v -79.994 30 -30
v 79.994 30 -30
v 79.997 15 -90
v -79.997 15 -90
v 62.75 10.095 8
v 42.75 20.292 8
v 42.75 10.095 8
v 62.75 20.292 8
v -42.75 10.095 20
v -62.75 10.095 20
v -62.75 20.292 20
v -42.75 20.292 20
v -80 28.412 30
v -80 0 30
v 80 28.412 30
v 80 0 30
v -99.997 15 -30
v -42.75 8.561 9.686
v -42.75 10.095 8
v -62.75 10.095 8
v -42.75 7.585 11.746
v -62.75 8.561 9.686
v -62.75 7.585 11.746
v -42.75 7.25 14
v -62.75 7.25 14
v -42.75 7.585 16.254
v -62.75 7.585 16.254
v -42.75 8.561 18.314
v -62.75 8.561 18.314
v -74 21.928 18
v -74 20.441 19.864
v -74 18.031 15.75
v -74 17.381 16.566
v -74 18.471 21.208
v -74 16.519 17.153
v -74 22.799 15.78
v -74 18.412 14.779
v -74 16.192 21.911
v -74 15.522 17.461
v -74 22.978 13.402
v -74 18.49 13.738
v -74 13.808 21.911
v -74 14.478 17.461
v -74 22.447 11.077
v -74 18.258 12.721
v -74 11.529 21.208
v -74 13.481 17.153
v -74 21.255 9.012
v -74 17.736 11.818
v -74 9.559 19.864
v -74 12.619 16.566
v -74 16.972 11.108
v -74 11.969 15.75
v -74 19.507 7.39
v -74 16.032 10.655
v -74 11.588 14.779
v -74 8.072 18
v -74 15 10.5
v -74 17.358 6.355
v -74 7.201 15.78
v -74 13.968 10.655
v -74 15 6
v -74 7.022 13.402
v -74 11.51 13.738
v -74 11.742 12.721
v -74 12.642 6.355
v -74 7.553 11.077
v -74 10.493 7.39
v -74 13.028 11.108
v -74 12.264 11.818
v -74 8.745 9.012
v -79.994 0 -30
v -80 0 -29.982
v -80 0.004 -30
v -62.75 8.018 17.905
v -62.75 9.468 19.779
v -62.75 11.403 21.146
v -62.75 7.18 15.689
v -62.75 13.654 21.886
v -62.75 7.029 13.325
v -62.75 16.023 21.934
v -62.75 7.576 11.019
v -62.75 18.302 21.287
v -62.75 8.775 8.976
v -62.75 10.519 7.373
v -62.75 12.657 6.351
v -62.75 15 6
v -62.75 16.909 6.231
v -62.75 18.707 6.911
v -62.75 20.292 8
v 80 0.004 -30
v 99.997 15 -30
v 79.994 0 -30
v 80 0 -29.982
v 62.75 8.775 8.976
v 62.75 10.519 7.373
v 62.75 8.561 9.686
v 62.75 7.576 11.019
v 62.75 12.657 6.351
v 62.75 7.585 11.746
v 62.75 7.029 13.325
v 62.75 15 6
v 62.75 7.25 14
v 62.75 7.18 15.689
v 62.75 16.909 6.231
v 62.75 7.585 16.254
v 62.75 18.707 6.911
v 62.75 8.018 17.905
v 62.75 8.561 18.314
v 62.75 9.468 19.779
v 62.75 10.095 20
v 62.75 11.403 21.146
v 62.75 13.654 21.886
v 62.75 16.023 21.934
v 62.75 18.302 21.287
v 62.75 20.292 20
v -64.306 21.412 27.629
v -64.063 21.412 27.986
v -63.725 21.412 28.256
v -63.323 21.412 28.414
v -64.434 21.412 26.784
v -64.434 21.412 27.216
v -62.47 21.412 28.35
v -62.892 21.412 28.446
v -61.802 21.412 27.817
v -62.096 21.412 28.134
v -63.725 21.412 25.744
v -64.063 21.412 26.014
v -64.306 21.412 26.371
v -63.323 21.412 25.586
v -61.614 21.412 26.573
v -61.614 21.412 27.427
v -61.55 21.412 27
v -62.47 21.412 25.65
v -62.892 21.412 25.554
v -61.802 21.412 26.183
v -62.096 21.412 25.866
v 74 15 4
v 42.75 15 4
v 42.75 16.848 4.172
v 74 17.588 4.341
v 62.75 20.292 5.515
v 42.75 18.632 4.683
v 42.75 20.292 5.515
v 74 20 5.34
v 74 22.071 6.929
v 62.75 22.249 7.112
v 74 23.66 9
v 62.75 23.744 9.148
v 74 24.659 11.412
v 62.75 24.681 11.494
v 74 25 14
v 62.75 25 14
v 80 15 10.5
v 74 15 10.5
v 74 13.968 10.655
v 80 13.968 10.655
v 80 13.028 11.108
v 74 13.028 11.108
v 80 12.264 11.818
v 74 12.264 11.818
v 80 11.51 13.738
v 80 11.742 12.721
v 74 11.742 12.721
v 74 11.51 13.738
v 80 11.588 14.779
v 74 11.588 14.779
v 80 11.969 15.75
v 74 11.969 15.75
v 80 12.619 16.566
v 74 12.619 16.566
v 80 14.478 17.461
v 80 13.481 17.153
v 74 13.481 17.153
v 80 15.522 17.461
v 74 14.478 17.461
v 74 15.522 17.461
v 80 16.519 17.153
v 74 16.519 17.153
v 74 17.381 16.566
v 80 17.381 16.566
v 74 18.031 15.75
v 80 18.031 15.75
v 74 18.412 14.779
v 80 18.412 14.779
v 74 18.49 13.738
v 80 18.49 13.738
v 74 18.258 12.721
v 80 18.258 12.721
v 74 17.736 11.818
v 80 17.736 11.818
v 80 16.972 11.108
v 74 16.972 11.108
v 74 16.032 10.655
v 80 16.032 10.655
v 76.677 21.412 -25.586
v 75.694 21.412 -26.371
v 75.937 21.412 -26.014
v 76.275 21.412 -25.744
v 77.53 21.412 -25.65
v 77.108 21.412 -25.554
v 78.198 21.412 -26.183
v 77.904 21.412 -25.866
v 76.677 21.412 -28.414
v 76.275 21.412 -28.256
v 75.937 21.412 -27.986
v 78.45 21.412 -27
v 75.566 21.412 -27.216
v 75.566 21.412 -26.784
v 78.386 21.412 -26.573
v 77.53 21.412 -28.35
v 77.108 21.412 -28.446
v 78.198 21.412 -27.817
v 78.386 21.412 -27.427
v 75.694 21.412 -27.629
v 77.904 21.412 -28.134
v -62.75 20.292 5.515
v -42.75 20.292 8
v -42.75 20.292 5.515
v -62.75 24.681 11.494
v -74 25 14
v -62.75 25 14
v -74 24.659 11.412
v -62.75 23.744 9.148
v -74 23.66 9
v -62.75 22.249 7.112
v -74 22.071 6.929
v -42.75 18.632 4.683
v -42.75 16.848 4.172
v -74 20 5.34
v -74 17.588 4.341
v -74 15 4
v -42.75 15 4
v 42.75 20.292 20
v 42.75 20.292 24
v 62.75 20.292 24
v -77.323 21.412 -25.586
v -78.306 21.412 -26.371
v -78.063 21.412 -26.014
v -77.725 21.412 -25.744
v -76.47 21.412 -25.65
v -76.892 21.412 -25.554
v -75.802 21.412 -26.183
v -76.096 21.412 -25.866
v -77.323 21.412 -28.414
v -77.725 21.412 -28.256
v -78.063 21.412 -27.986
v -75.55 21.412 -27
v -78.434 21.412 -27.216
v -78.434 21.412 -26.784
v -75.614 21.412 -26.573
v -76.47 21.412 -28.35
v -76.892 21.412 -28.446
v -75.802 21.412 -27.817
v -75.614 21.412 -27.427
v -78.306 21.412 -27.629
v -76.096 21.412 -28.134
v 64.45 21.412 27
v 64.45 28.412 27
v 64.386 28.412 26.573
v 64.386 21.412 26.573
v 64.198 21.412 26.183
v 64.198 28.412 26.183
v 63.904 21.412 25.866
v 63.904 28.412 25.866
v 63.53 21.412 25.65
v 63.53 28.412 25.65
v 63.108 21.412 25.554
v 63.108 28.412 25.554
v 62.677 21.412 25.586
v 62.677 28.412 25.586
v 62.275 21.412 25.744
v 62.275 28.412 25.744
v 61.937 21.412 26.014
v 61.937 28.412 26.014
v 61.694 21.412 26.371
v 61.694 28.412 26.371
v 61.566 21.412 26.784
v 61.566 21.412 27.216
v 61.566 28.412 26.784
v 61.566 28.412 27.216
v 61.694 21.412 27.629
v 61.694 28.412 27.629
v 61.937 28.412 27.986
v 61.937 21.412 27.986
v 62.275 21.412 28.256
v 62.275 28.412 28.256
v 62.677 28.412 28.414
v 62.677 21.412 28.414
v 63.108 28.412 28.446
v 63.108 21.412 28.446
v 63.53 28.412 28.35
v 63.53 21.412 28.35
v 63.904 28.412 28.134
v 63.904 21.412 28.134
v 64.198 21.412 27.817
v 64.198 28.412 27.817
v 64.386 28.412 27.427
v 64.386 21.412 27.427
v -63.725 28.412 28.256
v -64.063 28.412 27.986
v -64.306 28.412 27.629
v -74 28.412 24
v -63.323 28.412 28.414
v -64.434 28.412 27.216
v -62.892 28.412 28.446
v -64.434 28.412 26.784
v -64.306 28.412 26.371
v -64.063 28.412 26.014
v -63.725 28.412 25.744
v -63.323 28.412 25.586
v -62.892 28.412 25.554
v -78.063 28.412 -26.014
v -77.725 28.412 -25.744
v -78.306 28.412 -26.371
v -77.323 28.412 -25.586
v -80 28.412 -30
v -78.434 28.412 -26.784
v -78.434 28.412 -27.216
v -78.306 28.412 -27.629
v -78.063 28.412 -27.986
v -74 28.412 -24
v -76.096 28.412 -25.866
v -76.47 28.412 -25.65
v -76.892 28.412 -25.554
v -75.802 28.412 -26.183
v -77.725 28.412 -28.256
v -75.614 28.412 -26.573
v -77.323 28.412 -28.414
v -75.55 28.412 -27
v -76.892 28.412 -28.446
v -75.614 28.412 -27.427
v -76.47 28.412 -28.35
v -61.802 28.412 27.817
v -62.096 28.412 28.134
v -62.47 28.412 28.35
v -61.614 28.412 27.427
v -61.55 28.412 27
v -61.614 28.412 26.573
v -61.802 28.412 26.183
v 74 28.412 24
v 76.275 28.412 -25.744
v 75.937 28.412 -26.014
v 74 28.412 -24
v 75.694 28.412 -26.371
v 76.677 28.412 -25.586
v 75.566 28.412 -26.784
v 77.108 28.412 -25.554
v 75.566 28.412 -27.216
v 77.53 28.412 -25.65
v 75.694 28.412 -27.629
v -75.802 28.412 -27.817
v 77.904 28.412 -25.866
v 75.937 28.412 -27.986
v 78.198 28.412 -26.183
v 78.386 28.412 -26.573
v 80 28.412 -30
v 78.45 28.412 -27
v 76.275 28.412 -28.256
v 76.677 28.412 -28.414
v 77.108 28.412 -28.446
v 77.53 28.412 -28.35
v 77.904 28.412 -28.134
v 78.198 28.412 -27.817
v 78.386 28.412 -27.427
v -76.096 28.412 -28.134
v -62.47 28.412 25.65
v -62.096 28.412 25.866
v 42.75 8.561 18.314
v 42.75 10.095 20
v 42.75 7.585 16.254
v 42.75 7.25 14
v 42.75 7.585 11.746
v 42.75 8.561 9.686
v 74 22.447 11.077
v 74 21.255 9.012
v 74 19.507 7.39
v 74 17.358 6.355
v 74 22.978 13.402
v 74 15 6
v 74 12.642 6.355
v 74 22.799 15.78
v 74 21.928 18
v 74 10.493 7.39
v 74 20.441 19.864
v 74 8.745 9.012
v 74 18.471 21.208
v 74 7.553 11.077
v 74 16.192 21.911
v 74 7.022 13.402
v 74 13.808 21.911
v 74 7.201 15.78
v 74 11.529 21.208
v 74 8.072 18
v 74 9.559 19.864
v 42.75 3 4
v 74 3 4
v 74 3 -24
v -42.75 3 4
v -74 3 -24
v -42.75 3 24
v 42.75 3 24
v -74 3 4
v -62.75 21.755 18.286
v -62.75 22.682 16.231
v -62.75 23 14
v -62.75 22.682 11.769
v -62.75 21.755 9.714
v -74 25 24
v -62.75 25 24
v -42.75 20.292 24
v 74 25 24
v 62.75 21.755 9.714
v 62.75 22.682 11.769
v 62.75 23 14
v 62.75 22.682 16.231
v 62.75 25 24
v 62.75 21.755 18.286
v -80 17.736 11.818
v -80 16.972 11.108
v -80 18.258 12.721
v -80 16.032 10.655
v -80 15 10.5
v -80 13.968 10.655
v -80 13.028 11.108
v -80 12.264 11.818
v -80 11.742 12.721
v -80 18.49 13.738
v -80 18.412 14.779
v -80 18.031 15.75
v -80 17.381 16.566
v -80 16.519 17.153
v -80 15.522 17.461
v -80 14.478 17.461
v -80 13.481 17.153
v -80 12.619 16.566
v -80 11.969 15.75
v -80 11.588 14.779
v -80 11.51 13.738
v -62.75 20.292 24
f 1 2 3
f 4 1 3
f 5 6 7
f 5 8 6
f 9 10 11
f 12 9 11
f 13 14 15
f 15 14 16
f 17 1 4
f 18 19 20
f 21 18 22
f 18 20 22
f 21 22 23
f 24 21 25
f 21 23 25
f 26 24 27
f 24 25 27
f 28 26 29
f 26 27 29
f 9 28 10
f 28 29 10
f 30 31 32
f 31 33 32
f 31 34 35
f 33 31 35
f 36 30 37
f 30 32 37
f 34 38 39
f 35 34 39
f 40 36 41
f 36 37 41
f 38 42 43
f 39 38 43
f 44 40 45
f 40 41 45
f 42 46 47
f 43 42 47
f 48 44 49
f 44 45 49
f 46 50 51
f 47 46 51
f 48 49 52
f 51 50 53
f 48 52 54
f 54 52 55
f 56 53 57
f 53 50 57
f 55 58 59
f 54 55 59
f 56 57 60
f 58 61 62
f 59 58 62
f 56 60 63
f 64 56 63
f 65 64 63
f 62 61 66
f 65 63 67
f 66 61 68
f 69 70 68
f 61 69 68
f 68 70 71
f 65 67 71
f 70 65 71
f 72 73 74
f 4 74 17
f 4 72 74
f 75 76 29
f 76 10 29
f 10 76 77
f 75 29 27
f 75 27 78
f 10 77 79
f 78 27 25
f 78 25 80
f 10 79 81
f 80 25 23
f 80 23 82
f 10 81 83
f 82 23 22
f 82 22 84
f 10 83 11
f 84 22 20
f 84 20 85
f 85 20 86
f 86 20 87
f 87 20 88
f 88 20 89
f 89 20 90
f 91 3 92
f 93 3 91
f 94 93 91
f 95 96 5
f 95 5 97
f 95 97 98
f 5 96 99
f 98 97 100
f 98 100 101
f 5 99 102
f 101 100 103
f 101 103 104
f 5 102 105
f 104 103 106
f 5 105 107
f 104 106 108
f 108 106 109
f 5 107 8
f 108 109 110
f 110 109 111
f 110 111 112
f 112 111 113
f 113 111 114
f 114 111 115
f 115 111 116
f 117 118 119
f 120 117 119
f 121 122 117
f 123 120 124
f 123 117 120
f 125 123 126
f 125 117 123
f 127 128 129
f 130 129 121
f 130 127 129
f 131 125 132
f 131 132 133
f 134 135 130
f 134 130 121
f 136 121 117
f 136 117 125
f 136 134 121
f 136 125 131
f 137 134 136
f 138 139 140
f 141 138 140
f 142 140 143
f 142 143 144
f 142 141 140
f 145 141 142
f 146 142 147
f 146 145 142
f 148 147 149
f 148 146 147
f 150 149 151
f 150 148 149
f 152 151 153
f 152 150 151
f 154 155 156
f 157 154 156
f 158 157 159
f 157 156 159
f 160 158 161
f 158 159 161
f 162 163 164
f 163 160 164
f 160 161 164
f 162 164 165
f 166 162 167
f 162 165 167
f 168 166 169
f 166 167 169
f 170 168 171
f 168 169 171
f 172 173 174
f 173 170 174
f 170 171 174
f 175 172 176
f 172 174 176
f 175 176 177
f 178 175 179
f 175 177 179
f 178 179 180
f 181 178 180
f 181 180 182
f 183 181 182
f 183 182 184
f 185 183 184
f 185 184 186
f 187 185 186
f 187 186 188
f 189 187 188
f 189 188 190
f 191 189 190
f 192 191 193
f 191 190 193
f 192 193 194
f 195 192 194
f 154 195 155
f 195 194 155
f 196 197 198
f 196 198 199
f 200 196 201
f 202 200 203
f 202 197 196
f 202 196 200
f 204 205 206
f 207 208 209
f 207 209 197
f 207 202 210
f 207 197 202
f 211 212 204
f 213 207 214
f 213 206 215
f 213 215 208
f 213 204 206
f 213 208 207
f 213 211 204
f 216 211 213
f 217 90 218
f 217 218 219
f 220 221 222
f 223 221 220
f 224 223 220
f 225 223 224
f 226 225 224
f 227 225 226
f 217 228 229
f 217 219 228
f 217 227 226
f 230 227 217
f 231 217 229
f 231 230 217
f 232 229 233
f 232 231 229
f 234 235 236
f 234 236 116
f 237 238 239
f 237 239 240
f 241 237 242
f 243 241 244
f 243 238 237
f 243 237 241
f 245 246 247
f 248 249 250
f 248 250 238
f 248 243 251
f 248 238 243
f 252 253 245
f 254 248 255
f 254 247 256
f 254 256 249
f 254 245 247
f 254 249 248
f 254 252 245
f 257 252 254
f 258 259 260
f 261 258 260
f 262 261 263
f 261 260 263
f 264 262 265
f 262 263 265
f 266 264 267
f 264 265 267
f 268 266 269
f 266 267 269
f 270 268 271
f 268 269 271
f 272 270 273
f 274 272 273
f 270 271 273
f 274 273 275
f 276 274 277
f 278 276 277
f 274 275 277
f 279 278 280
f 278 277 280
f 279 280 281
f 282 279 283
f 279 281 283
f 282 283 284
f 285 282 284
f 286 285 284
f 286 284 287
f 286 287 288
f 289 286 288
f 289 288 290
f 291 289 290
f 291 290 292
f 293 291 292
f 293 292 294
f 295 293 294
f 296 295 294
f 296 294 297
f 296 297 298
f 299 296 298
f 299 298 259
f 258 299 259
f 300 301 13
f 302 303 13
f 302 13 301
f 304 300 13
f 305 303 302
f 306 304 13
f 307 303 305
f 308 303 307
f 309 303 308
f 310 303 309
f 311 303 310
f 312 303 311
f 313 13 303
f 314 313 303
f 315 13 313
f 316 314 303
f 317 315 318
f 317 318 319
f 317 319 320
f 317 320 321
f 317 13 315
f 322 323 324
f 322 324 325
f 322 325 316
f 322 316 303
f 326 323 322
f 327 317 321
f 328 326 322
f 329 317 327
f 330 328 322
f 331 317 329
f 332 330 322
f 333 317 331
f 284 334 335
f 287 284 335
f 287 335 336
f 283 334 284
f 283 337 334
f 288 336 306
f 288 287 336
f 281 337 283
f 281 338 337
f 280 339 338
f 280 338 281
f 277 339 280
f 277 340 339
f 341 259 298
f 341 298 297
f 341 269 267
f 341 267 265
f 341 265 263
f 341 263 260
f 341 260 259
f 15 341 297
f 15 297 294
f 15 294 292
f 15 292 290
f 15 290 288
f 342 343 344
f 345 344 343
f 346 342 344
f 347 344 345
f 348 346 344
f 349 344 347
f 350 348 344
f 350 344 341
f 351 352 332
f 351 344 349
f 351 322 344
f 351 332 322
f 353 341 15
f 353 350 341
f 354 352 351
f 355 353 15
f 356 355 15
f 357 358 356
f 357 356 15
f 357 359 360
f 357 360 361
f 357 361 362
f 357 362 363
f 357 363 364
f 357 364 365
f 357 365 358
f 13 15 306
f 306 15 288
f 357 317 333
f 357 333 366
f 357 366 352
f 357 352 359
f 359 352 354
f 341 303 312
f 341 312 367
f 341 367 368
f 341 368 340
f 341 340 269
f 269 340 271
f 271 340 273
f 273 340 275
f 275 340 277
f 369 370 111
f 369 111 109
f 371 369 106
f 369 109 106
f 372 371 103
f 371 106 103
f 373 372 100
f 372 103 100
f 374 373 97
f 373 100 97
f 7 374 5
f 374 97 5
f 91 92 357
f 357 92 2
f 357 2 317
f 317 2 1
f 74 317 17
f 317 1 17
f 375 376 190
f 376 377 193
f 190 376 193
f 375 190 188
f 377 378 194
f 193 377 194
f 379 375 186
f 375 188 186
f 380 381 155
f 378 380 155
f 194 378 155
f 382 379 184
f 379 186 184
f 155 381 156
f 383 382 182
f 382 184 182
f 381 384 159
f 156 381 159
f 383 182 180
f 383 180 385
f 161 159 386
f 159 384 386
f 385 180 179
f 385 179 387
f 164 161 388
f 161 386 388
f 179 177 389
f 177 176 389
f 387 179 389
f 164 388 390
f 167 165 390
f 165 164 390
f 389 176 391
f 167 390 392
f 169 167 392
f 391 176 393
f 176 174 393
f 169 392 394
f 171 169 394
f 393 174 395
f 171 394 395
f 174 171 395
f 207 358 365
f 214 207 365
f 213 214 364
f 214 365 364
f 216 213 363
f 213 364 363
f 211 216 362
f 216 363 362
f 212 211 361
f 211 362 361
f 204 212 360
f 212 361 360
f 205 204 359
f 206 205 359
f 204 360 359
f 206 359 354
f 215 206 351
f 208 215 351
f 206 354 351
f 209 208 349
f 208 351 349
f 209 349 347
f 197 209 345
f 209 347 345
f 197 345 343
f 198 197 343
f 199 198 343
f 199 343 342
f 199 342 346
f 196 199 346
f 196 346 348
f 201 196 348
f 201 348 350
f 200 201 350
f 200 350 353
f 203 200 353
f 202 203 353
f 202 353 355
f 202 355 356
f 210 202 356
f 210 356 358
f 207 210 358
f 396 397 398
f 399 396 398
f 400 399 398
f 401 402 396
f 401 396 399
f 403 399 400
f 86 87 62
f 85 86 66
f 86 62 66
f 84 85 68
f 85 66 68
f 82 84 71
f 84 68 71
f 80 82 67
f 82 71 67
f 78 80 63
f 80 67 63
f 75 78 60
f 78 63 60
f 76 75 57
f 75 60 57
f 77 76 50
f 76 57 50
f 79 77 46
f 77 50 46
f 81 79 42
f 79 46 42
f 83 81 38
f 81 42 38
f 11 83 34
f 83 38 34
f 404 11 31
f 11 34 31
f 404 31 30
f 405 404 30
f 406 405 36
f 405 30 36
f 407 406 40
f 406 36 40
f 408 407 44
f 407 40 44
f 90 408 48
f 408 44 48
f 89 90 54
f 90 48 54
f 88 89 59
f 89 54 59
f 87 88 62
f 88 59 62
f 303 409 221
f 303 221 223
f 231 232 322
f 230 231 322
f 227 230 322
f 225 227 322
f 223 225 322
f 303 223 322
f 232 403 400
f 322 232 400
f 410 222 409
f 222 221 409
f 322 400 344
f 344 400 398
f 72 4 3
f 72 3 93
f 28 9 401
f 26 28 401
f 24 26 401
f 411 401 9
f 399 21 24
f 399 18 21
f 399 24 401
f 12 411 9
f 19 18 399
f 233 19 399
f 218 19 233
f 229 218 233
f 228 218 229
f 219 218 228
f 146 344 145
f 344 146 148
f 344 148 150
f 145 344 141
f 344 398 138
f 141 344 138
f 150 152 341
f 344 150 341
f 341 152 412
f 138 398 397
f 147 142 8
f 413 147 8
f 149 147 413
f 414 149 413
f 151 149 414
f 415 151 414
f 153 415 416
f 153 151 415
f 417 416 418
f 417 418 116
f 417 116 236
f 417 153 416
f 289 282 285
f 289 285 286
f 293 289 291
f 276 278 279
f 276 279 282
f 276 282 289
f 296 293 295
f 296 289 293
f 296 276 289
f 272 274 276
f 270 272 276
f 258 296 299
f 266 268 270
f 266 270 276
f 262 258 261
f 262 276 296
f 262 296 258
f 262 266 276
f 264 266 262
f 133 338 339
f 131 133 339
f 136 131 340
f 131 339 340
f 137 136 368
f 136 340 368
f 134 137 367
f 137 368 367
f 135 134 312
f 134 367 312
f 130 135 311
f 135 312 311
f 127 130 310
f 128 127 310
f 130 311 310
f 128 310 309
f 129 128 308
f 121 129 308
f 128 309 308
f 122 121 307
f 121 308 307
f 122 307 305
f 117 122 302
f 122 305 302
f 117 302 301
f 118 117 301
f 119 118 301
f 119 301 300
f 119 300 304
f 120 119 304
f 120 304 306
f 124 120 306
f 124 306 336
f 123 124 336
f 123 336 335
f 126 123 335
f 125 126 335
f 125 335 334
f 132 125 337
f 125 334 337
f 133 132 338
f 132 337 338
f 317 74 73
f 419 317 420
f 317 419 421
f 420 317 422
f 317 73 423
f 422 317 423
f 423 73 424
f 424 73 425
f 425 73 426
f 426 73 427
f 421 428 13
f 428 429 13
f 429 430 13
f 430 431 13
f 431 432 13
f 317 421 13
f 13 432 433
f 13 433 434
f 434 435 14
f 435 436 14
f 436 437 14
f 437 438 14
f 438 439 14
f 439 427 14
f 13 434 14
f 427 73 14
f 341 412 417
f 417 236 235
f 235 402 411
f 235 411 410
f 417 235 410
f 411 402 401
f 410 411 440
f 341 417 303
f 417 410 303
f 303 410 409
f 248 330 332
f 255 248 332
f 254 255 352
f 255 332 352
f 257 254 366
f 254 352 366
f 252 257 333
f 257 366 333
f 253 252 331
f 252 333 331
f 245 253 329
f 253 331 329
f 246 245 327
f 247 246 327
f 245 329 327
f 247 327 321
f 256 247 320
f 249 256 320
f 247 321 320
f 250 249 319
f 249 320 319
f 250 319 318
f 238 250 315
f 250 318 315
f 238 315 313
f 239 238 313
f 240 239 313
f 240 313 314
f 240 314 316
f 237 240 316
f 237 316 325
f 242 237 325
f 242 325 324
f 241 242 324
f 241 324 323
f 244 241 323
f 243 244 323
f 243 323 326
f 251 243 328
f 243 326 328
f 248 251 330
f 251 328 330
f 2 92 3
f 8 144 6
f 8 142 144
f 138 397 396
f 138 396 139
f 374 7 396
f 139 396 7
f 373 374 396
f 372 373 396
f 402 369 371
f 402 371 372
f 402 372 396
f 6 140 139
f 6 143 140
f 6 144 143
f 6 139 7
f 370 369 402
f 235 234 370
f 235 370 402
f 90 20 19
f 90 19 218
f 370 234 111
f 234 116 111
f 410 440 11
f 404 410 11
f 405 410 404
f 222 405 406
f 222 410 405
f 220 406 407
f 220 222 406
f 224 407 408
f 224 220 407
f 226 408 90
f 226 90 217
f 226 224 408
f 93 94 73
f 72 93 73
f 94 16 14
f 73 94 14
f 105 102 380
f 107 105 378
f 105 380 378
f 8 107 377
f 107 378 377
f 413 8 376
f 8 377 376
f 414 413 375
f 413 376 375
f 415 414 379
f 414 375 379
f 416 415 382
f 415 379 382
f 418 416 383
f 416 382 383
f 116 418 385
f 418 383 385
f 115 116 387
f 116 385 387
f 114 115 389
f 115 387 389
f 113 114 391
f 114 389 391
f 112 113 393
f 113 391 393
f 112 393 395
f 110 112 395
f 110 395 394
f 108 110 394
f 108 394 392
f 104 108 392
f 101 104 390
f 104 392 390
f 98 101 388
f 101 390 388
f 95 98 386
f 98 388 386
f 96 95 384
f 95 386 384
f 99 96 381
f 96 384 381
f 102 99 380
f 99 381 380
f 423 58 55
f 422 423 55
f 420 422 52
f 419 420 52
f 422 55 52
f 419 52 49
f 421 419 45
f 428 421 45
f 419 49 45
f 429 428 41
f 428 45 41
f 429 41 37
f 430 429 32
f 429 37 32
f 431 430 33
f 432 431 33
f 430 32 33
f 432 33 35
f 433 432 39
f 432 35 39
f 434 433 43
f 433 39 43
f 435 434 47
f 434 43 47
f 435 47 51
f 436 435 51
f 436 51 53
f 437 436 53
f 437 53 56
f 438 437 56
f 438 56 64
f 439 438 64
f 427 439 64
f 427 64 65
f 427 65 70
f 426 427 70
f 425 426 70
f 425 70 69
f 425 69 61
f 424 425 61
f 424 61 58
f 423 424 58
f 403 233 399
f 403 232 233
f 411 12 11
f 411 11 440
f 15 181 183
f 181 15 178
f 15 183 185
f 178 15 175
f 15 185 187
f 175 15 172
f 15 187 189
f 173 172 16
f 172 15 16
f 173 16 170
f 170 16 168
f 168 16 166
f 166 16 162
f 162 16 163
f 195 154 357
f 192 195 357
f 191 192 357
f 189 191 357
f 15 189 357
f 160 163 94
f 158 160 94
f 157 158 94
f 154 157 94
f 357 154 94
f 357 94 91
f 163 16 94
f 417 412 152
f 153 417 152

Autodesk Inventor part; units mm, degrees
ref_plane "YZ Plane" through (0, 0, 0) normal (1, 0, 0) x (0, 1, 0)
ref_plane "XZ Plane" through (0, 0, 0) normal (0, 1, 0) x (-1, 0, 0)
sketch "Sketch1" plane through (0, 0, 0) normal (0, 1, 0) x (-1, 0, 0)
  line L0 (80, 30) -> (-80, 30)
  line L1 (-80, 30) -> (-80, -30)
  line L2 (-80, -30) -> (80, -30)
  line L3 (80, -30) -> (80, 30)
  line L4 (80, 30) -> (-80, -30) construction
  line L5 (-80, 30) -> (80, -30) construction
  line L6 (0, -42) -> (0, 42) projected
  point P0 (0, 0)
  point P1 (-100, -30)
  point P2 (-80, -27)
  dimension "d0" = 160
  dimension "d1" = 60
  dimension "d32" = 20
extrude "Extrusion1" add sketch "Sketch1" along normal blind 3
sketch "Sketch2" plane through (0, 3, 0) normal (0, 1, 0) x (1, 0, 0)
  line L0 (-80, 30) -> (-80, -30) projected
  line L1 (-80, -30) -> (80, -30) projected
  line L2 (80, -30) -> (80, 30) projected
  line L3 (74, -24) -> (-74, -24)
  line L4 (-74, -24) -> (-74, 24)
  line L5 (-74, 24) -> (74, 24)
  line L6 (74, 24) -> (74, -24)
  line L7 (74, -24) -> (-74, 24) construction
  line L8 (-74, -24) -> (74, 24) construction
  line L9 (80, 30) -> (-80, 30) projected
  point P0 (0, 0)
  dimension "d36" = 148
  dimension "d37" = 48
extrude "Extrusion2" add sketch "Sketch2" along normal blind 24
sketch "Sketch7" plane through (-74, 3, 24) normal (1, 0, 0) x (0, 0, -1)
  circle A0 centre (10, 12) radius 8
  line L0 (54, -3) -> (-6, -3) projected
  circle A1 centre (10, 12) radius 10
  line L1 (0, 12) -> (0, 0)
  line L2 (0, 12) -> (20, 12)
  line L3 (20, 12) -> (20, 0)
  line L4 (-6, -3) -> (-6, 24) projected
  line L5 (0, 0) -> (20, 0)
  line L6 (10, 22) -> (0, 22)
  line L7 (0, 0) -> (0, 24) projected
  line L8 (0, 12) -> (0, 22)
  point P0 (24, -3)
  point P1 (54, -3)
  dimension "MotorDiameter" = 16
  dimension "d18" = 15
  dimension "d20" = 2
  dimension "d40" = 20
  dimension "d62" = 10
extrude "Extrusion5" add sketch "Sketch7" along normal blind 11.25 contours L2 A1 A0 | A0 L2 A1 | L3 L5 L1 A1 | L7 L6 A1
sketch "Sketch8" plane through (-62.75, 3, 24) normal (1, 0, 0) x (0, 0, -1)
  arc A0 (20, 12) -> (10, 22) centre (10, 12) ccw projected
  circle A1 centre (10, 12) radius 8 projected
  line L0 (0, 0) -> (0, 22) projected
  line L1 (20, 0) -> (0, 0) projected
  line L2 (20, 0) -> (20, 12) projected
  circle A2 centre (10, 12) radius 7.75
  line L3 (10, 22) -> (0, 22) projected
  line L4 (0, 0) -> (0, 22) projected
  line L5 (4, 7.0946) -> (4, 17.2915)
  line L6 (10, 22) -> (0, 22) projected
  line L7 (16, 7.0946) -> (16, 17.2915)
  line L8 (16, 17.2915) -> (18.4853, 17.2915)
  arc A3 (20, 12) -> (10, 22) centre (10, 12) ccw projected
  line L9 (4, 17.2915) -> (0, 17.2915)
  point P0 (24, -3)
  point P1 (4, 27)
  point P2 (4, 16.9054)
  point P3 (16, 16.9054)
  dimension "d55" = 15.5
  dimension "d63" = 12
  dimension "d64" = 6
extrude "Extrusion6" add sketch "Sketch8" along normal blind 20 contours L2 L1 L0 L9 A1 L8 A0 | A1 L5 A2 L7 | A2 L7 | L5 A2 picked at (9.114, 4.2488)
sketch "Sketch9" plane through (-74, 20, 20) normal (1, 0, 0) x (0, 0, -1)
  circle A0 centre (6, -5) radius 3.5
  line L0 (50, -20) -> (-10, -20) projected
  line L1 (-10, -20) -> (-10, 7) projected
  point P0 (20, -20)
  point P1 (44, -20)
  dimension "d27" = 7
  dimension "d28" = 15
  dimension "d41" = 16
extrude "Extrusion7" cut sketch "Sketch9" against normal up to surface (6 mm away)
mirror "Mirror2" about plane through (0, 0, 0) normal (1, 0, 0) of "Extrusion7", "Extrusion6", "Extrusion5"
sketch "Sketch15" plane through (80, 0, 30) normal (1, 0, 0) x (0, 0, -1)
  line L0 (60, 27) -> (0, 27) projected
  circle A0 centre (16, 15) radius 3.5 projected
  line L1 (0, 0) -> (60, 0) projected
  line L2 (60, 0) -> (60, 27) projected
  line L3 (0, 27) -> (60, 27) projected
  line L4 (0, 0) -> (0, 27) projected
  line L5 (60, 0) -> (60, 27) projected
  line L6 (120.0188, 15.0047) -> (60, 0)
  line L7 (60, 0) -> (60, 27) projected
  line L8 (60, 0) -> (60, 30)
  line L9 (60, 15) -> (120, 15)
  line L10 (60, 30) -> (120, 15)
  point P0 (30, 0)
  dimension "d104" = 30
  dimension "d105" = 15
  dimension "d106" = 60
extrude "Extrusion18" add sketch "Sketch15" against normal up to surface (160 mm away) contours L8 L10 L9 L2 | L9 L6 L2
ref_plane "Work Plane9" through (79, -4, -30) normal (0, 0, -1) x (-1, 0, 0)
sketch "Sketch23" plane through (79, -4, -30) normal (0, 0, -1) x (-1, 0, 0)
  line L0 (-1, 34) -> (-21, 19)
  line L1 (-21, 19) -> (-1, 19)
  line L2 (-21, 19) -> (-1, 4)
  line L3 (-1, 31) -> (159, 31) projected
  line L4 (-1, 34) -> (-1, 31) projected
  line L5 (-1, 34) -> (159, 34) projected
  line L6 (159, 34) -> (159, 31) projected
  line L7 (159, 4) -> (-1, 4) projected
  line L8 (-1, 4) -> (-1, 31) projected
  line L9 (159, 31) -> (-1, 31) projected
  line L10 (159, 4) -> (159, 31) projected
  point P0 (79, 4)
  dimension "d97" = 20
  dimension "d108" = 15
extrude "Extrusion19" add sketch "Sketch23" along normal blind 60 contours L4 L8 L1 L0 | L1 L8 L2
ref_plane "Work Plane4" through (100, 15, -30) normal (-0.5883, -0.7845, 0.1961) x (-0.8, 0.6, 0)
sketch "Sketch24" plane through (100, 15, -30) normal (-0.5883, -0.7845, 0.1961) x (-0.8, 0.6, 0)
  line L0 (-89.1969, -73.3175) -> (145.8797, -73.3175)
  line L1 (145.8797, -73.3175) -> (145.8797, 67.3582)
  line L2 (145.8797, 67.3582) -> (-89.1969, 67.3582)
  line L3 (-89.1969, 67.3582) -> (-89.1969, -73.3175)
  point P0 (71, -15.2971)
extrude "Extrusion20" cut sketch "Sketch24" against normal blind 60
ref_plane "Work Plane5" through (80, 15, -90) normal (0.5883, -0.7845, -0.1961) x (0.3162, 0, 0.9487)
sketch "Sketch25" plane through (80, 15, -90) normal (0.5883, -0.7845, -0.1961) x (0.3162, 0, 0.9487)
  line L0 (-115.6054, 99.2741) -> (196.6383, 99.2741)
  line L1 (196.6383, 99.2741) -> (196.6383, -110.1424)
  line L2 (196.6383, -110.1424) -> (-115.6054, -110.1424)
  line L3 (-115.6054, -110.1424) -> (-115.6054, 99.2741)
  point P0 (60.0833, 91.1655)
extrude "Extrusion21" cut sketch "Sketch25" along normal blind 60
mirror "Mirror10" about plane through (0, 0, 0) normal (1, 0, 0) of "Extrusion19", "Extrusion20", "Extrusion21"
sketch "Sketch26" plane through (0, 27, 0) normal (0, 1, 0) x (1, 0, 0)
  line L0 (-80, 30) -> (-80, -30) projected
  line L1 (-80, -30) -> (80, -30) projected
  line L2 (80, -30) -> (80, 30) projected
  line L3 (80, 30) -> (-80, 30) projected
  line L4 (-74, 24) -> (74, 24) projected
  line L5 (74, 24) -> (74, -24) projected
  line L6 (74, -24) -> (-74, -24) projected
  line L7 (-74, -24) -> (-74, 24) projected
  point P0 (0, 0)
extrude "Extrusion22" add sketch "Sketch26" along normal blind 1.4125
sketch "Sketch27" plane through (0, 28.4125, 0) normal (0, 1, 0) x (1, 0, 0)
  line L0 (-80, 30) -> (-80, -30) projected
  line L1 (-80, -30) -> (80, -30) projected
  line L2 (80, -30) -> (80, 30) projected
  line L3 (-80, 30) -> (80, 30) projected
  line L4 (-74, -24) -> (-74, 24) projected
  line L5 (-74, 24) -> (74, 24) projected
  line L6 (74, 24) -> (74, -24) projected
  line L7 (74, -24) -> (-74, -24) projected
  line L8 (80, -30) -> (80, 30) projected
  line L9 (80, -27) -> (-80, -27)
  line L10 (-80, 30) -> (-80, -30) projected
  line L11 (80, 27) -> (-80, 27)
  line L12 (-80, -30) -> (80, -30) projected
  line L13 (77, -30) -> (77, 30)
  circle A0 centre (63, -27) radius 1.45
  circle A1 centre (77, 27) radius 1.45
  line L14 (0, 114) -> (0, -54) projected
  circle A2 centre (-63, -27) radius 1.45
  circle A3 centre (-77, 27) radius 1.45
  point P0 (0, 0)
  dimension "d111" = 3
  dimension "d112" = 3
  dimension "d113" = 3
  dimension "d114" = 2.9
  dimension "d115" = 17
  dimension "d116" = 2.9
extrude "Extrusion23" cut sketch "Sketch27" against normal blind 7 contours A3 L11 | L11 A3 | A2 L9 | L9 A2 | A1 L11 L13 | L13 L11 A1 | L11 L13 A1 | L11 A1 L13 | A0 L9 | L9 A0
ref_plane "Work Plane7" through (-100, 15, -30) normal (-0.5883, 0.7845, -0.1961) x (0.8, 0.6, 0)
ref_plane "Work Plane8" through (-80, 15, -90) normal (0.5883, 0.7845, 0.1961) x (-0.3162, 0, 0.9487)
equation "\"d0\" = Width"
equation "\"d1\" = Length"
equation "\"d32\" = -0.5 * Width + 0.5 * FullWidth"
equation "\"d2\" = BaseWallThickness"
equation "\"d36\" = Width - 2 * SideWallThickness"
equation "\"d37\" = Length - 2 * SideWallThickness"
equation "\"d5\" = Height - 2 * BaseWallThickness"
equation "\"d18\" = DriveMotorHeight"
equation "\"d20\" = DriveMotorMountThickness"
equation "\"d28\" = DriveMotorHeight"
equation "\"d41\" = SideWallThickness + DriveMotorMountThickness + 0.5 * MotorDiameter"
equation "\"d104\" = Height"
equation "\"d105\" = 0.5 * Height"
equation "\"d106\" = WedgeLength"
equation "\"d97\" = SideTriangleWidth"
equation "\"d98\" = WedgeLength"
equation "\"d100\" = WedgeLength"
equation "\"d102\" = WedgeLength"
equation "\"SideWallThickness\" = 6"
equation "\"BaseWallThickness\" = 3"
equation "\"Width\" = 160"
equation "\"Length\" = 60"
equation "\"Height\" = 30"
equation "\"DriveMotorHeight\" = 0.5 * Height"
equation "\"DriveMotorMountThickness\" = 2"
equation "\"WedgeLength\" = 60"
equation "\"SideTriangleWidth\" = 20"
equation "\"ScrewHoleDia\" = 2.9"
equation "\"ScrewDepth\" = 7"
equation "\"FullWidth\" = 200"
properties part number "BodyWedgeV3" material "Thermoplastic Resin"
